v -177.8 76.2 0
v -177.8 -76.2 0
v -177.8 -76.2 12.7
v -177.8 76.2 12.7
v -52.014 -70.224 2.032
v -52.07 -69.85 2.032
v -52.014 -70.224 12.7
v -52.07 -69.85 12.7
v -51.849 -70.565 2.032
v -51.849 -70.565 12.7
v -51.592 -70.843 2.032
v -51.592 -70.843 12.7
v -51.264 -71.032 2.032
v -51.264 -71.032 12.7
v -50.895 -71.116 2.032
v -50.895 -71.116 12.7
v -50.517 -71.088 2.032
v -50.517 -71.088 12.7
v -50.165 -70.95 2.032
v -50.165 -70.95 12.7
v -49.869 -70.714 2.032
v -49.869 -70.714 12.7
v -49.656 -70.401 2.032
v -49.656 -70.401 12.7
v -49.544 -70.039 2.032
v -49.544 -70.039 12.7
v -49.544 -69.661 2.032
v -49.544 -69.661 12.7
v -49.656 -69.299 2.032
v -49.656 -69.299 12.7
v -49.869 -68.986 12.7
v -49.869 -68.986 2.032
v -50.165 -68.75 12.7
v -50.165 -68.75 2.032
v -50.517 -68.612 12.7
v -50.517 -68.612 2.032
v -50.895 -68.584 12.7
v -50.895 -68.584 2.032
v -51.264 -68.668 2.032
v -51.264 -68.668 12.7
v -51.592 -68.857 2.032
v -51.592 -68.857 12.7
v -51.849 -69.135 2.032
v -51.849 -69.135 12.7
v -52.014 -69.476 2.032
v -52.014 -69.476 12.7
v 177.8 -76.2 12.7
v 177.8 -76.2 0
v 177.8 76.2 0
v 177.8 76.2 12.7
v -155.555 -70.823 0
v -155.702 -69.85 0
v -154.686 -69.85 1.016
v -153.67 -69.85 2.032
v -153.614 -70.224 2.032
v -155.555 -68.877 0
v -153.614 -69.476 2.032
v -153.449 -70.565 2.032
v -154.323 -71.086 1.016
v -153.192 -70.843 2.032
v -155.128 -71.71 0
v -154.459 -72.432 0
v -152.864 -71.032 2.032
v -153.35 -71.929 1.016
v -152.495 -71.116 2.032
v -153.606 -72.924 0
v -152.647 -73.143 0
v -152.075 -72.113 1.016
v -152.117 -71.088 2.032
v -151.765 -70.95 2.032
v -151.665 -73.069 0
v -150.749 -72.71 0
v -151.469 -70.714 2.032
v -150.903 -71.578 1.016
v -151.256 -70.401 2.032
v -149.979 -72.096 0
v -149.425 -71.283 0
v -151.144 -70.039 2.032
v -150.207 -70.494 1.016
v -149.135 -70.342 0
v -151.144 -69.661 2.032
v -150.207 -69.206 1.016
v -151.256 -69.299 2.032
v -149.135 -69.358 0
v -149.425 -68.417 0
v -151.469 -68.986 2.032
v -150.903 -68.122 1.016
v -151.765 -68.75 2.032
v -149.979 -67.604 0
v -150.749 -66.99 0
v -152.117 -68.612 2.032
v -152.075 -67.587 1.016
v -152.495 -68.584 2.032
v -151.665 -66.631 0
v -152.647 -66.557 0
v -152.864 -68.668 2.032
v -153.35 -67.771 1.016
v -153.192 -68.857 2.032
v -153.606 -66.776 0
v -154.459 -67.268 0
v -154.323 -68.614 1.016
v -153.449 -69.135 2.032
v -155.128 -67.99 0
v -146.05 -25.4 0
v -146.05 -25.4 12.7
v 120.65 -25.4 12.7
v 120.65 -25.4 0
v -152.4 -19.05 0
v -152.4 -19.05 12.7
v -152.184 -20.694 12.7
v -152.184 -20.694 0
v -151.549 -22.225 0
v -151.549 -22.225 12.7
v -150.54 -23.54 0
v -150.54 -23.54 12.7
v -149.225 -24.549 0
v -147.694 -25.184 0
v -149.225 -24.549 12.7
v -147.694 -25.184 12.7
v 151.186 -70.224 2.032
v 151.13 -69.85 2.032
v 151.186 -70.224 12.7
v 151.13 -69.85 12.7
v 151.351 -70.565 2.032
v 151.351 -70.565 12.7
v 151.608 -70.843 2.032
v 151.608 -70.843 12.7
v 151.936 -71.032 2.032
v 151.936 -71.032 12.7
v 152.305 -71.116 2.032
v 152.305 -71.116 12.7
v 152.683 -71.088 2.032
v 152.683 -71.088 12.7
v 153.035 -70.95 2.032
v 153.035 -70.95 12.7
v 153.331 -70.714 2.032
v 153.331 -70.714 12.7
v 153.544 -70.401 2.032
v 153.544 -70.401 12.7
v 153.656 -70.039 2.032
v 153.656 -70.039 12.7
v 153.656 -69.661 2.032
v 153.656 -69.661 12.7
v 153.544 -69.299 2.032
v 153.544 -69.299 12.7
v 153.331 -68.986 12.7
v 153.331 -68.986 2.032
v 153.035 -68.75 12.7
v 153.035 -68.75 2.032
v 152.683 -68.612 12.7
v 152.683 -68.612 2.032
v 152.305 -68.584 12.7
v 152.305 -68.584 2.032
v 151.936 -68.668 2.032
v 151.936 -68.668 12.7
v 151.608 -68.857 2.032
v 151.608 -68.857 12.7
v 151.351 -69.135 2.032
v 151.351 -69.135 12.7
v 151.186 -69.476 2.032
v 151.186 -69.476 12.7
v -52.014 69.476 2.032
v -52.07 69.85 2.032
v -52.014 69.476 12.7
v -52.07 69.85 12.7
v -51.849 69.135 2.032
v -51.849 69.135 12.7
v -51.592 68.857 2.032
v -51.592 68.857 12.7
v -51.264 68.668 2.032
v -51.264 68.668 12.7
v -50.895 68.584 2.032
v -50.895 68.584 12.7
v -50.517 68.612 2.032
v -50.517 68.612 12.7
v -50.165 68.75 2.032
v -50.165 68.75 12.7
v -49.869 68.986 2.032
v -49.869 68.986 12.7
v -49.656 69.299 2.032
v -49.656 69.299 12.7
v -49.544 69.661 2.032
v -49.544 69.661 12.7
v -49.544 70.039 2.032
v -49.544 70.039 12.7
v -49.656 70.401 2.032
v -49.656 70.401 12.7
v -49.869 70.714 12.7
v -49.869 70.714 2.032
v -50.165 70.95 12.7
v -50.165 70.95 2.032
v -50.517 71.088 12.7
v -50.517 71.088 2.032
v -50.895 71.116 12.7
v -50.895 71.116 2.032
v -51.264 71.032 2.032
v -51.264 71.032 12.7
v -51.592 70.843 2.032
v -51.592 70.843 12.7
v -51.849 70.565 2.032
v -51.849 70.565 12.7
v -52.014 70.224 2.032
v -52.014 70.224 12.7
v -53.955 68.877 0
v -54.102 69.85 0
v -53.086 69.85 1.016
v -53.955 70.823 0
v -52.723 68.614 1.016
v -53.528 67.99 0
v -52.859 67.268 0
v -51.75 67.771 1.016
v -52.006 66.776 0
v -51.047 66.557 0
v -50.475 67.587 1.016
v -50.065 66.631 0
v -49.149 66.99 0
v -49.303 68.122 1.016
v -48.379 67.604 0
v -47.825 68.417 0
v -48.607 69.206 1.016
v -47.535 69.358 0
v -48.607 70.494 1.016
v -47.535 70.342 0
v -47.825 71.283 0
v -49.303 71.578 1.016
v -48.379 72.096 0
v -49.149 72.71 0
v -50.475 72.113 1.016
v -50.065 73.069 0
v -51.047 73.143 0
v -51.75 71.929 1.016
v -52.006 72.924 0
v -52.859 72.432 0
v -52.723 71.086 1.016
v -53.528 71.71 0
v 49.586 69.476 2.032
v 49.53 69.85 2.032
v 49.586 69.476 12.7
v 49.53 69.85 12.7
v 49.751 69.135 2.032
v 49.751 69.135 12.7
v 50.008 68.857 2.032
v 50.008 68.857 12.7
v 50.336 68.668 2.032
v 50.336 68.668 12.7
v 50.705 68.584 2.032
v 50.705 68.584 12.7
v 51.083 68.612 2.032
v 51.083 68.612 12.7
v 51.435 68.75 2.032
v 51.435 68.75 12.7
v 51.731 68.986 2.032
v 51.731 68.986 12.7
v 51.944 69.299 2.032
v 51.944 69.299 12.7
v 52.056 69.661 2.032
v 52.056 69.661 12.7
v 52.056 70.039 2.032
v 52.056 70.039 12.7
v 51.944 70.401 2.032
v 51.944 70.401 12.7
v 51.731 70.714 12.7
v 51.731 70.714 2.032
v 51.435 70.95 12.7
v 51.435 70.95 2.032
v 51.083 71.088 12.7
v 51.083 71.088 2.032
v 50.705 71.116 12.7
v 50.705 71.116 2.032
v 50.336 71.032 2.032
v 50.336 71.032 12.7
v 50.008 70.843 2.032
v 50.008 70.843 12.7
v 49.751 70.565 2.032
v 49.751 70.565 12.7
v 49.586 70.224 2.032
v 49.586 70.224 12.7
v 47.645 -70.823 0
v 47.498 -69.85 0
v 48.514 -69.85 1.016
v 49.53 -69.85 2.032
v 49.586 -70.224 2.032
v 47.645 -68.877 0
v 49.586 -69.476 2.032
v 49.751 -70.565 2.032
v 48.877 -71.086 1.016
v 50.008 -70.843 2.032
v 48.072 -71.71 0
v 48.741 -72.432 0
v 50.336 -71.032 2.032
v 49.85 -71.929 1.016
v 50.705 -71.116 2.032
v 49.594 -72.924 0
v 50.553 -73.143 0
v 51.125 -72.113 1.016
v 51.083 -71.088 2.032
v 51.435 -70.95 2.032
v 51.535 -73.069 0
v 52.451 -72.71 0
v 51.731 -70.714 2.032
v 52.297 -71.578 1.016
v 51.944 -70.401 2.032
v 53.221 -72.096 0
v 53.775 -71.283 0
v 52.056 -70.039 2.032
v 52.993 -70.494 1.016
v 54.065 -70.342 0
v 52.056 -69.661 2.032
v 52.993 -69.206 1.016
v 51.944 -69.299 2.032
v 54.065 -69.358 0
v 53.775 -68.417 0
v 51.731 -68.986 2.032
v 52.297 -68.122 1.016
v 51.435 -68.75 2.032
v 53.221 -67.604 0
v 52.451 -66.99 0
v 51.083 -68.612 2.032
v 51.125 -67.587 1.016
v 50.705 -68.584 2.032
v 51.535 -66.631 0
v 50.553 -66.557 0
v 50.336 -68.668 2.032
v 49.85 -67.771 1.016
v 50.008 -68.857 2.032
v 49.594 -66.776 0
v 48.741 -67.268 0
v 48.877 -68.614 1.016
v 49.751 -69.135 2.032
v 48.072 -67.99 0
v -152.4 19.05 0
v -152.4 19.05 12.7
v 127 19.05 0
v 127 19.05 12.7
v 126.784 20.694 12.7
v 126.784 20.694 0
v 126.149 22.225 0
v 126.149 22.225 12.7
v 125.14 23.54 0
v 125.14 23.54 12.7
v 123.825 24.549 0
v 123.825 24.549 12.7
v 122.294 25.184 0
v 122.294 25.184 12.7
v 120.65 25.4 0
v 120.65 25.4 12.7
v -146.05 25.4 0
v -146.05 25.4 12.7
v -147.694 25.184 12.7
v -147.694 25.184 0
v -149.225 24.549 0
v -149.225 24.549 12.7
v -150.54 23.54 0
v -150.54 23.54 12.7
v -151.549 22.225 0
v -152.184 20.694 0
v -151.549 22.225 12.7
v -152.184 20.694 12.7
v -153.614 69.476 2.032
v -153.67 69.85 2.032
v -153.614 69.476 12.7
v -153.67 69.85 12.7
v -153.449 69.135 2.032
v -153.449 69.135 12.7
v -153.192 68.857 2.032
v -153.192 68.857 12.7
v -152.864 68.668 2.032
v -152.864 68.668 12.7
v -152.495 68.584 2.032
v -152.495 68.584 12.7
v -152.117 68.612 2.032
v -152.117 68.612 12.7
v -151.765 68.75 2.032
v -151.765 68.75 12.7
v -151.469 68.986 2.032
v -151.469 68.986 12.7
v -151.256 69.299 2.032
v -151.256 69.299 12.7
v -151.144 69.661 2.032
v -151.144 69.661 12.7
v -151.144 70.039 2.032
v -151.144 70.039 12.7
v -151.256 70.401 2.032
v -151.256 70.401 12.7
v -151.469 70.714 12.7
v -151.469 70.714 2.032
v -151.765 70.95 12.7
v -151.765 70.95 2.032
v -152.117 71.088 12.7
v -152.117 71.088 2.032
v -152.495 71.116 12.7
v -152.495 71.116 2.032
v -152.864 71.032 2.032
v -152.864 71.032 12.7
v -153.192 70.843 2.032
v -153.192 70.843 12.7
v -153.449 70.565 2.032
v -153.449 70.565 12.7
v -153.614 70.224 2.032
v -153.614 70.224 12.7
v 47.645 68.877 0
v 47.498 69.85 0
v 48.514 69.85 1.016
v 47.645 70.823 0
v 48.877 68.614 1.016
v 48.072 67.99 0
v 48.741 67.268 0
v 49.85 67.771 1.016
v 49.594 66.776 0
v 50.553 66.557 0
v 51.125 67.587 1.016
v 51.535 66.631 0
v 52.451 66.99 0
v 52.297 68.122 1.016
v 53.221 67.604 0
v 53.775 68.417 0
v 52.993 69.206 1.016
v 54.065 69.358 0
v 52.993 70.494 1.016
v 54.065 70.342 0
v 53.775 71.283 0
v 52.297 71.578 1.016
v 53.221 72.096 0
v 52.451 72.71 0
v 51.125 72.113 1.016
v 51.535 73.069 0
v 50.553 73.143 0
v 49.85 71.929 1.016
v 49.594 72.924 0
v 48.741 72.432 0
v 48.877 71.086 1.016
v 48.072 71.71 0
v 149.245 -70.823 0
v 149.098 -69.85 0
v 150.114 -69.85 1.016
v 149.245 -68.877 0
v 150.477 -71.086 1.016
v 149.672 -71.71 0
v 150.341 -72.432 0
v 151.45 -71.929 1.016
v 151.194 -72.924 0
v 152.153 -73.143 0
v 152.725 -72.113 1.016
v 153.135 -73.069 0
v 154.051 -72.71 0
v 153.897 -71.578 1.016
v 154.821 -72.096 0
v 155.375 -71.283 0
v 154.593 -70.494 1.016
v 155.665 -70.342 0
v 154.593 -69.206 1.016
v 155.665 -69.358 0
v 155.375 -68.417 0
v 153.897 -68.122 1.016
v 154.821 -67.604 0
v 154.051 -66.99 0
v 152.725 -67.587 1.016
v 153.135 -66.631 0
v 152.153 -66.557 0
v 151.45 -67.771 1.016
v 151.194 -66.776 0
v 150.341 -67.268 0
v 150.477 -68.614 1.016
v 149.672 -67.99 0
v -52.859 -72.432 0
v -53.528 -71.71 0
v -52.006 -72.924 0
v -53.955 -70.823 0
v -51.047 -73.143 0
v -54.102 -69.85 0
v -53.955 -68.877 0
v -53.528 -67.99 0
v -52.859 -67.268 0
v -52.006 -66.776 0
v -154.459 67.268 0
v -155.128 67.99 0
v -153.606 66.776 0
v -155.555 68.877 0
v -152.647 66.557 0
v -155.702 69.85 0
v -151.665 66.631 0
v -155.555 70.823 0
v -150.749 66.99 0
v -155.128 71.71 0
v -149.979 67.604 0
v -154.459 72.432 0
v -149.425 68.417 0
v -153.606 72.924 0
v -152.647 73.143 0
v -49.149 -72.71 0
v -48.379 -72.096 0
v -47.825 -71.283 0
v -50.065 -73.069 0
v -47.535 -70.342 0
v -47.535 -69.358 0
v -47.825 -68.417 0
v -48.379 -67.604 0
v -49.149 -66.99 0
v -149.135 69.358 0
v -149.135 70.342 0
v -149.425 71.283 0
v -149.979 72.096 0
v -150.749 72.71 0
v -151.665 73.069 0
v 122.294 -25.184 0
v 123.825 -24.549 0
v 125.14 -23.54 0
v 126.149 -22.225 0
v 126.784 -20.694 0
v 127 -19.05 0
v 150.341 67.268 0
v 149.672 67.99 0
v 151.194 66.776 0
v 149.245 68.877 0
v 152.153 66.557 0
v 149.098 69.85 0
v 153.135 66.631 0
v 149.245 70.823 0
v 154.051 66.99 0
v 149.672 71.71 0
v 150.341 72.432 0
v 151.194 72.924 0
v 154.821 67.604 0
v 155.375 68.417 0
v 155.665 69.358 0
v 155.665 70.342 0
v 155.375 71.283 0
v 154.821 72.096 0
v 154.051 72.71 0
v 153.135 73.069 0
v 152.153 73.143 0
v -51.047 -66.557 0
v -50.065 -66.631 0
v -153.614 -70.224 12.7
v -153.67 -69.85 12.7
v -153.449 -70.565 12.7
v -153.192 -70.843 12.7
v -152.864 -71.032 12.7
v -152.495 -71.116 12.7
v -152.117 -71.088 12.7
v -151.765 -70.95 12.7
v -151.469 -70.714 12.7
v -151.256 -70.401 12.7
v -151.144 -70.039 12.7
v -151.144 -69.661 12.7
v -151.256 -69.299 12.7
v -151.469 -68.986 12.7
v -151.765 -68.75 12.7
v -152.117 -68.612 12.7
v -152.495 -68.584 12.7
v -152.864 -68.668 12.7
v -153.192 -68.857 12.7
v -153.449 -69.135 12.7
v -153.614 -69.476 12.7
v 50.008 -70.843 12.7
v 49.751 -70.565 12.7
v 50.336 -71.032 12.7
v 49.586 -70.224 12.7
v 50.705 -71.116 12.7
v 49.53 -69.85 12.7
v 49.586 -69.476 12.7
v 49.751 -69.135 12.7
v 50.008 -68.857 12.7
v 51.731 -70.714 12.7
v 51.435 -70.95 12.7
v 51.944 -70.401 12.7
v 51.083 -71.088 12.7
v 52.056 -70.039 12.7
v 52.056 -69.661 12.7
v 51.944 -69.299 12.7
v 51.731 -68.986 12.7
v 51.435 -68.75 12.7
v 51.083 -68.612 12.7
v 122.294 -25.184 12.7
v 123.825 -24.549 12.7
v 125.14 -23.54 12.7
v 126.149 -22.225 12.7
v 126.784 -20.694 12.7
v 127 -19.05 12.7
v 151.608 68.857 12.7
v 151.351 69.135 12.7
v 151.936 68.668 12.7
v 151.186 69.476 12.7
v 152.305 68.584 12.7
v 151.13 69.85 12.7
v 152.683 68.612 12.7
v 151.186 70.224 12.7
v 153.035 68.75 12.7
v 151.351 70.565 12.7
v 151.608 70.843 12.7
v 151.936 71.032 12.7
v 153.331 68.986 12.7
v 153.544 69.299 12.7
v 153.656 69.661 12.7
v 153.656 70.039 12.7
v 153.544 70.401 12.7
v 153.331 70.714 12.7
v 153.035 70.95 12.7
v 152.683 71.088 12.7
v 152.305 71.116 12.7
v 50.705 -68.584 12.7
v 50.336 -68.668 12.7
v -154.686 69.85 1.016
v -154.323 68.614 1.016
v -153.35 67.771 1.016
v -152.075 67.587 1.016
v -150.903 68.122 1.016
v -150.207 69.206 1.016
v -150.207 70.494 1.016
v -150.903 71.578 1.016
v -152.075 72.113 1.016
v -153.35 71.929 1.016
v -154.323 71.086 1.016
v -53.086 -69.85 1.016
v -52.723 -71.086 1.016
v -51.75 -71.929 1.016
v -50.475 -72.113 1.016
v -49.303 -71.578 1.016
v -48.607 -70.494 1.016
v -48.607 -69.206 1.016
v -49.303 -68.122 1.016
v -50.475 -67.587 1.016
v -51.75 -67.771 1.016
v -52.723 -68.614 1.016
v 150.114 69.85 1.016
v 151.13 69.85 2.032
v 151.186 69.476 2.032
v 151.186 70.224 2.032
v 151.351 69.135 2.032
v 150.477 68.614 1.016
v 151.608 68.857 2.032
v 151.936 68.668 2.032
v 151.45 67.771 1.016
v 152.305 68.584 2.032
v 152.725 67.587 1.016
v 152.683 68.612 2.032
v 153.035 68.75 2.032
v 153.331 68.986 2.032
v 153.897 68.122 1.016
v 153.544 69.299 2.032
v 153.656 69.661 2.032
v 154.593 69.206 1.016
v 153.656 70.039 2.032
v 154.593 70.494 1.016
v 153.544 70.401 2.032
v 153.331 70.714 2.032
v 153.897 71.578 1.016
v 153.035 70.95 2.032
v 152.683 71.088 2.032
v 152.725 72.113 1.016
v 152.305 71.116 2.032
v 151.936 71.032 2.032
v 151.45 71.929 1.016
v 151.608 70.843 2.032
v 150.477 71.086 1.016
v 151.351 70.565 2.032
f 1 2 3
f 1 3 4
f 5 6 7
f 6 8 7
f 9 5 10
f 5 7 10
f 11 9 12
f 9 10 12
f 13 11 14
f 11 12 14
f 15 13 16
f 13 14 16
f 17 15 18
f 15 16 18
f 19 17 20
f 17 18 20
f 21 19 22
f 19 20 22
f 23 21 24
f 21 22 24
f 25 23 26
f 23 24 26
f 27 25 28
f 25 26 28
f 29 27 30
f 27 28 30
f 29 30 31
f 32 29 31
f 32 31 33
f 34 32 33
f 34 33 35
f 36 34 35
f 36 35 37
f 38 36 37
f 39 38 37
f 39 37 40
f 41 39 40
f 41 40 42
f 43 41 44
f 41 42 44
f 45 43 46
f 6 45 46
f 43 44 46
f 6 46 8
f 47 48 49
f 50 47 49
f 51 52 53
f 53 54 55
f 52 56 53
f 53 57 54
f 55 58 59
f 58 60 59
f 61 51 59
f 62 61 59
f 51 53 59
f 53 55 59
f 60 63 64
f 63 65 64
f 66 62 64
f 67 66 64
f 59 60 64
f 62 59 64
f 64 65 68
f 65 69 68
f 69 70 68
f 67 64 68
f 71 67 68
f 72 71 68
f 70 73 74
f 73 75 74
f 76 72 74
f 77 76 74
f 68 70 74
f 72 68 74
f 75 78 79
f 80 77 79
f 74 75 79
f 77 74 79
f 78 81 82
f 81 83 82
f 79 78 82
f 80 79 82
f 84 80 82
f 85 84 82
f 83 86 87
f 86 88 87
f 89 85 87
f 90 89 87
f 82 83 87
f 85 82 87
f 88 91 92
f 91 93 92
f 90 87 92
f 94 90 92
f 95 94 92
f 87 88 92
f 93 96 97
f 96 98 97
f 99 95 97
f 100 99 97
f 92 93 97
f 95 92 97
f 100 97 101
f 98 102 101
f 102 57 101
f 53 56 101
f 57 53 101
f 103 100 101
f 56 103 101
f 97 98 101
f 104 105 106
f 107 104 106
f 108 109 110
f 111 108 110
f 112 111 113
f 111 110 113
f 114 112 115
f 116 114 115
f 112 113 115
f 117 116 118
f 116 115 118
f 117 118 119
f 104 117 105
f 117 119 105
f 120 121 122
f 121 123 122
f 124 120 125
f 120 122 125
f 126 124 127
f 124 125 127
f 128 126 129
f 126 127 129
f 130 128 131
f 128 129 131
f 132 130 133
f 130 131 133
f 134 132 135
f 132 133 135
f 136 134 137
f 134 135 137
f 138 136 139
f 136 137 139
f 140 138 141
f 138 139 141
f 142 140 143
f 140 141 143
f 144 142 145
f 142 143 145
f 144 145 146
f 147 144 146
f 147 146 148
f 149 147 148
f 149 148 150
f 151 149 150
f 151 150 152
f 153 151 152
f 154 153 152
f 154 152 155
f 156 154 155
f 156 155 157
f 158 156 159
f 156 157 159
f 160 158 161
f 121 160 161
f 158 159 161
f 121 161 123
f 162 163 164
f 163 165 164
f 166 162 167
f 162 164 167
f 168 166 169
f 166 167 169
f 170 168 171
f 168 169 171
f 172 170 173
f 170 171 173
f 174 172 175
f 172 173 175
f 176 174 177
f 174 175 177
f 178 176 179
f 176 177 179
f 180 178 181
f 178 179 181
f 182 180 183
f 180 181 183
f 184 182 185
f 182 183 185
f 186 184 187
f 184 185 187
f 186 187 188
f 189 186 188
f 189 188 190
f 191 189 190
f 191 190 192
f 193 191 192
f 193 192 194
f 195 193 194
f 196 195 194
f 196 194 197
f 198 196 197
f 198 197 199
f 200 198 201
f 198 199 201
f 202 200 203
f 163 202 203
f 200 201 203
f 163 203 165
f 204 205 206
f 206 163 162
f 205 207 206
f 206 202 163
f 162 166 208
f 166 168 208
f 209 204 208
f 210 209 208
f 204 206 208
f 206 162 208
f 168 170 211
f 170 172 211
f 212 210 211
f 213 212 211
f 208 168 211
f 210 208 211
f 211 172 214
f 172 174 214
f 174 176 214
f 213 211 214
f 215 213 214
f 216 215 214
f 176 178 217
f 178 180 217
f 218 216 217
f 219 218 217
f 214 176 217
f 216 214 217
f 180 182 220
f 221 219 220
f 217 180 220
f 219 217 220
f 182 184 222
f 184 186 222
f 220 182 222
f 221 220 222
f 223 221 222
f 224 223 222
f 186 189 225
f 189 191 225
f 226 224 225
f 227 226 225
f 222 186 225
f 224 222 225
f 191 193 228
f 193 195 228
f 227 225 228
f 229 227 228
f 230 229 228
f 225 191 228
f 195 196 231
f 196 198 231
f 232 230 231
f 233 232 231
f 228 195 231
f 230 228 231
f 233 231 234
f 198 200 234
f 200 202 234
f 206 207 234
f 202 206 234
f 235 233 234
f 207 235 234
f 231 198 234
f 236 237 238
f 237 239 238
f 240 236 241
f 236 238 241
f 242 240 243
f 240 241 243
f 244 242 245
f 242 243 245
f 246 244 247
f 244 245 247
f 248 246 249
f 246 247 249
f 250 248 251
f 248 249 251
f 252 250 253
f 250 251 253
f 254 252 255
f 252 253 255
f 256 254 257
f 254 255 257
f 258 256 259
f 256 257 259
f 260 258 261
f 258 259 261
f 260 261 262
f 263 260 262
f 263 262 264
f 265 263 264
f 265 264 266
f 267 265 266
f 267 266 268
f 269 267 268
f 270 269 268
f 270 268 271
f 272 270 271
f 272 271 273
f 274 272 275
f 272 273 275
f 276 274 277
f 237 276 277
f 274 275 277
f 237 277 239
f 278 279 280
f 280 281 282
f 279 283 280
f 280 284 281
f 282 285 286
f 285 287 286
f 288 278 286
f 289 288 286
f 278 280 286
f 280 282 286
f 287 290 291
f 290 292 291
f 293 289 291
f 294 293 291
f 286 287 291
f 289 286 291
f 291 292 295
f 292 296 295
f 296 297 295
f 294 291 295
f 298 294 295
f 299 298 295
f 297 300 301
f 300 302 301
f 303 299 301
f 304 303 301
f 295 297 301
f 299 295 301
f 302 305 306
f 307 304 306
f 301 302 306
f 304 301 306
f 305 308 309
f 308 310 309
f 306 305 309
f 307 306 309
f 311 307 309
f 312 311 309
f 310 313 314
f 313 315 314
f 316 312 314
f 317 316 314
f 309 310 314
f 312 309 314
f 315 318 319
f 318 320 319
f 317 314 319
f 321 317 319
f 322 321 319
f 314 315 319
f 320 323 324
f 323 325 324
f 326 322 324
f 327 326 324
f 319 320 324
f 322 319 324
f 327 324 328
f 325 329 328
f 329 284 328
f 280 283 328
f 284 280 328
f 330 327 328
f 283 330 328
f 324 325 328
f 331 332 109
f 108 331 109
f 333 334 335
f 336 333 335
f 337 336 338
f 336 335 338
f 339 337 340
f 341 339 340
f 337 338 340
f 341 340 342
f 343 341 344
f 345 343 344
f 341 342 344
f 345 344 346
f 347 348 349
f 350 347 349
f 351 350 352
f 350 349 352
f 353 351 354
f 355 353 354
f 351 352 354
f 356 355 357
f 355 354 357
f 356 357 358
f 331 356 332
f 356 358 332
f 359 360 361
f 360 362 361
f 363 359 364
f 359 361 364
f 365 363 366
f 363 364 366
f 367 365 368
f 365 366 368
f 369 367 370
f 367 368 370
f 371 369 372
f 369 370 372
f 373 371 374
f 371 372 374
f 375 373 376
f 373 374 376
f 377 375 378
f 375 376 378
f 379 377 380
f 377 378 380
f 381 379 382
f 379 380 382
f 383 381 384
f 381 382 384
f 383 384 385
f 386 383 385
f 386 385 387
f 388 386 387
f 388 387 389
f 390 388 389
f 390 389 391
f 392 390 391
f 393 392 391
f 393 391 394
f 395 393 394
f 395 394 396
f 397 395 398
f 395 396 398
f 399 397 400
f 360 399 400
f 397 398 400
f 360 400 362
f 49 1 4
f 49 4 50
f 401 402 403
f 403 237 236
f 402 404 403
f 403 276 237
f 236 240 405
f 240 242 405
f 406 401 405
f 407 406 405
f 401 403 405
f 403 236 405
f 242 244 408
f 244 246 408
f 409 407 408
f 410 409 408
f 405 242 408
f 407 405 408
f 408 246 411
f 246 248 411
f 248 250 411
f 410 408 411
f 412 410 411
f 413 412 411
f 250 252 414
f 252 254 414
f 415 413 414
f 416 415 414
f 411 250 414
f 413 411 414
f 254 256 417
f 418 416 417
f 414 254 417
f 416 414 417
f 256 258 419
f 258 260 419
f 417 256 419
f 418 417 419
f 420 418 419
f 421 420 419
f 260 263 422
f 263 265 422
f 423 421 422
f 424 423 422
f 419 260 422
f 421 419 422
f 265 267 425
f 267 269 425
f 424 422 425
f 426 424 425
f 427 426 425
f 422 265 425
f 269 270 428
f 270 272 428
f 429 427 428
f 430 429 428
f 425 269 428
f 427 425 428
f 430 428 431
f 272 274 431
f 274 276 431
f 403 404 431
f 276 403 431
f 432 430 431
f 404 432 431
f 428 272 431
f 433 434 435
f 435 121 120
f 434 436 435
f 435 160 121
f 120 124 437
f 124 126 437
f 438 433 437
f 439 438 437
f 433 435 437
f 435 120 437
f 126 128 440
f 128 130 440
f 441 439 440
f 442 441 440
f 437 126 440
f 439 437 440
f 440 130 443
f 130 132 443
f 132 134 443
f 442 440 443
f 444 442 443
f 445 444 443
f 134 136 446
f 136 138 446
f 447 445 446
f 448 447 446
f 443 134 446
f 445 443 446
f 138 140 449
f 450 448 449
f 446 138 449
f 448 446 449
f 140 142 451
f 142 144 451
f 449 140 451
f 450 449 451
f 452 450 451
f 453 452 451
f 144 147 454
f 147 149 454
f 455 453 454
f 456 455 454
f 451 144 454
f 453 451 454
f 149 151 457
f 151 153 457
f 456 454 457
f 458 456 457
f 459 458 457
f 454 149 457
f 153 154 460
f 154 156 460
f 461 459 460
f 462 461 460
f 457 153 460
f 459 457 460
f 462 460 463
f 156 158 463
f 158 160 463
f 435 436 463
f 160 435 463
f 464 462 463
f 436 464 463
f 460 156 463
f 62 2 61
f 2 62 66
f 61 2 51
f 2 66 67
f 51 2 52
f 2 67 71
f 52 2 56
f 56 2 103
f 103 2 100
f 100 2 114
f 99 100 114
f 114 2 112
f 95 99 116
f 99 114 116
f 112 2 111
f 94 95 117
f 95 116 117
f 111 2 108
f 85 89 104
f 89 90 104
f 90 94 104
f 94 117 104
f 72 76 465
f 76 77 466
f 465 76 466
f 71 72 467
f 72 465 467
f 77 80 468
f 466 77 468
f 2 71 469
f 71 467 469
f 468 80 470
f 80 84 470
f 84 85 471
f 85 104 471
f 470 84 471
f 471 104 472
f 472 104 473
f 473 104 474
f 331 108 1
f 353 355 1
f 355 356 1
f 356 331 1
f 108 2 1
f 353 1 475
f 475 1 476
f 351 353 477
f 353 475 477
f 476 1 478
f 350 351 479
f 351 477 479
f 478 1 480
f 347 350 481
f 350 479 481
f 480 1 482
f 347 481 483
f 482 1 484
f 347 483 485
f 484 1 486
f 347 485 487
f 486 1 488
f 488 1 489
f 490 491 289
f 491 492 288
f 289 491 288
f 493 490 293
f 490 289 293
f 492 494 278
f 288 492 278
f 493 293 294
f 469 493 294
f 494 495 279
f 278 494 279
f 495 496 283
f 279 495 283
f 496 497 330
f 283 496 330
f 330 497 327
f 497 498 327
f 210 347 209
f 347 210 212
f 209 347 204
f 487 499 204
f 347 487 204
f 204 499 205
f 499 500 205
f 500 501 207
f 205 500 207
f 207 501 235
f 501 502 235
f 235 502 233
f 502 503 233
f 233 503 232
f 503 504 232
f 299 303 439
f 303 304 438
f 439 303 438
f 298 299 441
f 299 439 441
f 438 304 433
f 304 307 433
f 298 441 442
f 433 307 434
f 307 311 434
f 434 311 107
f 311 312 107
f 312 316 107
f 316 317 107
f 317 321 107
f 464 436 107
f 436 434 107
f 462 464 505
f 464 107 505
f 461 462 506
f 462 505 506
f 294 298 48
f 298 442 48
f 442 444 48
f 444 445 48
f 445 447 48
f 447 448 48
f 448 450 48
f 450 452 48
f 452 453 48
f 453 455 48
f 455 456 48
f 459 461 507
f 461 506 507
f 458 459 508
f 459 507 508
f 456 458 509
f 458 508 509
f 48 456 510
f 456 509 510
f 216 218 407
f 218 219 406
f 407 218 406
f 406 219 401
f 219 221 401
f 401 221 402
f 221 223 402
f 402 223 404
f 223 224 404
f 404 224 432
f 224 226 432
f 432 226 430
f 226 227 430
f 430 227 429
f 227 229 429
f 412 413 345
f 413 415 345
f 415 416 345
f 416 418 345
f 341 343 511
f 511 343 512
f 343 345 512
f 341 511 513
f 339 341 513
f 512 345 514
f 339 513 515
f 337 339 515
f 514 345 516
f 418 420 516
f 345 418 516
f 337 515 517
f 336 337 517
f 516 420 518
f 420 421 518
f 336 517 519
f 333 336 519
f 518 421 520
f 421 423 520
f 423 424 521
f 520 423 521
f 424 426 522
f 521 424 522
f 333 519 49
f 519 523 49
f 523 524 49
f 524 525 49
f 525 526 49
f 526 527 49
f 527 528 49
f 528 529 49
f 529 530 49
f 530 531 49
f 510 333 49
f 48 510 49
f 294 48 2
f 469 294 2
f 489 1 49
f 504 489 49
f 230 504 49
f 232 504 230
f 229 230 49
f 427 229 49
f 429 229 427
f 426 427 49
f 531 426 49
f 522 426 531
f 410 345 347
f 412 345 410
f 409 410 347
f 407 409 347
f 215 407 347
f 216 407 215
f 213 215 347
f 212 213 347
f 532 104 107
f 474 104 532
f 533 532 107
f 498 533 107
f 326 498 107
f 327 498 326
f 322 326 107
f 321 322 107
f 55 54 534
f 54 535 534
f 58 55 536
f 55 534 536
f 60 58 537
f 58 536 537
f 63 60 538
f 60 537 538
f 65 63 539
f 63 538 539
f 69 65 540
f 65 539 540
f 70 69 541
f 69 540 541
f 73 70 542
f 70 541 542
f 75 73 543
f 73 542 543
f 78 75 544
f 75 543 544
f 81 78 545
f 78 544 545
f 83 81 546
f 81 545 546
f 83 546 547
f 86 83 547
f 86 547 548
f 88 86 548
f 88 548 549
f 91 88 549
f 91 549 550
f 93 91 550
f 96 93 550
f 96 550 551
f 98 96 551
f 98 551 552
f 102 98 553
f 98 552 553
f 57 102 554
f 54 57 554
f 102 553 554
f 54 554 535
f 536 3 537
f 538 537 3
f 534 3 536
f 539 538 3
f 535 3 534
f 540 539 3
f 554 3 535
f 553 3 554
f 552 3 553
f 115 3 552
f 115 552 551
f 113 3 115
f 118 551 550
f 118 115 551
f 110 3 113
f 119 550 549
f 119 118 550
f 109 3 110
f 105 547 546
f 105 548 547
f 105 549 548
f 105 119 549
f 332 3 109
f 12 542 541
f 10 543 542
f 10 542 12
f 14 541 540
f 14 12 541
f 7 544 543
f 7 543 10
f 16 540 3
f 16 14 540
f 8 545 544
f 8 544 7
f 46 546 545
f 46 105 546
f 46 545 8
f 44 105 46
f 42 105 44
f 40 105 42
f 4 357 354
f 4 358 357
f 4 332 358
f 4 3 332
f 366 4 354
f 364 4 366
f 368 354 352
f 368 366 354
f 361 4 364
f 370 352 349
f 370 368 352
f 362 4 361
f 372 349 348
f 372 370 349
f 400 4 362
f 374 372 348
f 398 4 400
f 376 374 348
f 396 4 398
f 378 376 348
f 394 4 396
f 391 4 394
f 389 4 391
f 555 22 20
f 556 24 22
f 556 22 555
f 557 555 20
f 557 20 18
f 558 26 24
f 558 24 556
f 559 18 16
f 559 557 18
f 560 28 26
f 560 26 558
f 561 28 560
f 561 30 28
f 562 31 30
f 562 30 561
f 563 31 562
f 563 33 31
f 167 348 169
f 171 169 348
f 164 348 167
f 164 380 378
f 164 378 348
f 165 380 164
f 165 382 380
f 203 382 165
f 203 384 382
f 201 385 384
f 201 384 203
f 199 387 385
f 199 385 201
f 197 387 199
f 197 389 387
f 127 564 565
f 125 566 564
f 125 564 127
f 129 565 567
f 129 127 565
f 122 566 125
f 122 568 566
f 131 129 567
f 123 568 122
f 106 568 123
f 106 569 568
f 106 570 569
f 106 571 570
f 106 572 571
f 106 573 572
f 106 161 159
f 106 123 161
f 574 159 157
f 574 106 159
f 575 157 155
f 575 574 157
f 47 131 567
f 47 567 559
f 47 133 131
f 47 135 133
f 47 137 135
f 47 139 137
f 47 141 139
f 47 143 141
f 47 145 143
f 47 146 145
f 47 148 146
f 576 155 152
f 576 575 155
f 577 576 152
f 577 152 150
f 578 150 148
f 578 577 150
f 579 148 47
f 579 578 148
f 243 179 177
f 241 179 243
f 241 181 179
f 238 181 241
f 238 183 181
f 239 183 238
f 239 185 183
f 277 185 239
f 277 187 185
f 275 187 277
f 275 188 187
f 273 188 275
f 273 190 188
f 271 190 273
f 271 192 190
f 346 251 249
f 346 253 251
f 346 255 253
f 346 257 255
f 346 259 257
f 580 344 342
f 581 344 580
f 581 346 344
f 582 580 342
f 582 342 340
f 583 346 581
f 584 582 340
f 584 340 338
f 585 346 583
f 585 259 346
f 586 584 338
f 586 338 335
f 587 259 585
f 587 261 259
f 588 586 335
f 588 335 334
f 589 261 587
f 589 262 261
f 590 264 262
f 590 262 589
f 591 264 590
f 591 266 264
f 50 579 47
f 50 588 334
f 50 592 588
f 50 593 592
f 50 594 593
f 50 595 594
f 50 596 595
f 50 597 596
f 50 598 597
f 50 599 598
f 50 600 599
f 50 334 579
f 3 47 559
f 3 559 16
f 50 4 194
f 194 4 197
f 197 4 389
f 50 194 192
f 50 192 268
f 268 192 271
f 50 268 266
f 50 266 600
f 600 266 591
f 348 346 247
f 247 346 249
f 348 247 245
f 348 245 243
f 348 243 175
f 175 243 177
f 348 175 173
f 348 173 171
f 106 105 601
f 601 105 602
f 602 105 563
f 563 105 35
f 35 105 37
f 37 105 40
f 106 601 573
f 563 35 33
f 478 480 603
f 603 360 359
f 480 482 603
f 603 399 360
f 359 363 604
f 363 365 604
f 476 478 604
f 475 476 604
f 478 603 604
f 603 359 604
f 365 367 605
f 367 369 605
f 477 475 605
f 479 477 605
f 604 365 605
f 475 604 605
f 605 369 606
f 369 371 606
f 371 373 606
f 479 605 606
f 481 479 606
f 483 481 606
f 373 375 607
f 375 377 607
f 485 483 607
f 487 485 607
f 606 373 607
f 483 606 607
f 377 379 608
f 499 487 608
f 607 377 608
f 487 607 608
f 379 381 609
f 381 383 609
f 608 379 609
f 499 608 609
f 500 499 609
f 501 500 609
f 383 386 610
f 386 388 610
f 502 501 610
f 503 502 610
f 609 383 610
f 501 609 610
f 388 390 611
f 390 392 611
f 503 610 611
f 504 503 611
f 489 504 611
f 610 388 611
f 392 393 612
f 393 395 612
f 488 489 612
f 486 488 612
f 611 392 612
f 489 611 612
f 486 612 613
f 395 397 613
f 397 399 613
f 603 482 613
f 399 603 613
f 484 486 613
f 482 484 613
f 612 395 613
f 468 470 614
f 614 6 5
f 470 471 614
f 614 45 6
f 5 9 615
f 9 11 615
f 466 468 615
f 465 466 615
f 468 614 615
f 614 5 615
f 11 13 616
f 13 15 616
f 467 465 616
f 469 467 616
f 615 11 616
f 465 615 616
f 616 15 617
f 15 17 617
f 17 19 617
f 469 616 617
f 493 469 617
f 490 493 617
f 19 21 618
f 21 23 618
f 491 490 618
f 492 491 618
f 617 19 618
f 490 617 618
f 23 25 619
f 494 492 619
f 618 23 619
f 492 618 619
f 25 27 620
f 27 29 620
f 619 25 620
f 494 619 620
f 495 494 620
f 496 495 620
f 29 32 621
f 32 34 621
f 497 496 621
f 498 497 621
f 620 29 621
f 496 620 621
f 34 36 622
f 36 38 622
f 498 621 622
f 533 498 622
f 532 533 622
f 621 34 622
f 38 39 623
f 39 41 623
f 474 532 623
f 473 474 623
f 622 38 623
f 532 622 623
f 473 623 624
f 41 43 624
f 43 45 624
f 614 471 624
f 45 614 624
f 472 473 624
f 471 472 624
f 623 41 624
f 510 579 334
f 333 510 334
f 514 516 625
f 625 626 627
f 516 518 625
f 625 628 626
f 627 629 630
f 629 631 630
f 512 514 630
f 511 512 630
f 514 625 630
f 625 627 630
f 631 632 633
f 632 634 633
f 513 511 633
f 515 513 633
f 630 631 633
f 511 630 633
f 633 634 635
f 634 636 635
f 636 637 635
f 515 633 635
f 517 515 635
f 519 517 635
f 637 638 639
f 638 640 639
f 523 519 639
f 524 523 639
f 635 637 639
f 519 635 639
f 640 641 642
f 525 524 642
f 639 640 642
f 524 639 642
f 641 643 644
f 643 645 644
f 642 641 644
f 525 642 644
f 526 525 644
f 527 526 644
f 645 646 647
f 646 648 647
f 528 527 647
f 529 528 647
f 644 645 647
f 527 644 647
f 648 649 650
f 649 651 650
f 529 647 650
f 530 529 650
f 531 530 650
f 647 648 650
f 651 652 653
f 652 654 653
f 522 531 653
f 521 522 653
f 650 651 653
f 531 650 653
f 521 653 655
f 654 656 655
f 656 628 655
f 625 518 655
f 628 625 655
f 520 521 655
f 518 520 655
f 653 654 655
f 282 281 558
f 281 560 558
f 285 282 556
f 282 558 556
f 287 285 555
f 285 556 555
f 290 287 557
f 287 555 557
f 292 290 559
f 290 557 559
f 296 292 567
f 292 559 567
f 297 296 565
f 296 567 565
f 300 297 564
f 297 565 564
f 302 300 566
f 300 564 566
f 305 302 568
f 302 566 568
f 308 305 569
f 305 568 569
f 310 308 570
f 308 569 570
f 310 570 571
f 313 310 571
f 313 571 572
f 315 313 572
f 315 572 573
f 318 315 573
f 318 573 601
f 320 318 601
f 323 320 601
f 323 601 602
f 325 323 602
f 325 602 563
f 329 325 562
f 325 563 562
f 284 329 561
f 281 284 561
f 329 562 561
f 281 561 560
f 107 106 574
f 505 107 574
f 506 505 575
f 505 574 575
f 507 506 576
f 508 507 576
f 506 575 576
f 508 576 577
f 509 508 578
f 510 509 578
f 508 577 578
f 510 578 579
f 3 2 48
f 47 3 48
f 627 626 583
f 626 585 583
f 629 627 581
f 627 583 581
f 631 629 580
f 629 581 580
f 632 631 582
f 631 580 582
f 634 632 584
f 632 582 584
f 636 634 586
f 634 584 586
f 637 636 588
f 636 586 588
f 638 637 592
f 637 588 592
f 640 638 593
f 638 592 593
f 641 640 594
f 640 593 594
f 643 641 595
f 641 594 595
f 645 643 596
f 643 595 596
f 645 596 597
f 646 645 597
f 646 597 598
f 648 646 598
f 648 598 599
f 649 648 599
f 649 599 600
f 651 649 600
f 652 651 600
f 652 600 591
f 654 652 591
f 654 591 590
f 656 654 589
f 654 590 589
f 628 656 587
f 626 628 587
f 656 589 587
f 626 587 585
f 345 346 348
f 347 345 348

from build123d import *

# Parameters (mm, degrees)
F0_W           = 355.6
F0_H           = 152.4
F1_DEPTH       = 12.7
F3_DEPTH       = 12.701
F5_D           = 2.54
F5_CSINK_D     = 6.604
F5_CSINK_ANGLE = 90


with BuildPart() as f1:
    # F0 (on Top) → F1 (new body)
    with BuildSketch(Plane.XY):
        Rectangle(F0_W, F0_H)
    extrude(amount=F1_DEPTH)

    # F2 (on face) → F3 (cut, through all)
    with BuildSketch(Plane.XY.offset(12.7)):
        with BuildLine():
            Line((120.65, 25.4), (-146.05, 25.4))
            ThreePointArc((-146.05, 25.4), (-150.540128, 23.540128), (-152.4, 19.05))
            Line((-152.4, 19.05), (-152.4, -19.05))
            ThreePointArc((-152.4, -19.05), (-150.540128, -23.540128), (-146.05, -25.4))
            Line((-146.05, -25.4), (120.65, -25.4))
            ThreePointArc((120.65, -25.4), (125.140128, -23.540128), (127, -19.05))
            Line((127, -19.05), (127, 19.05))
            ThreePointArc((127, 19.05), (125.140128, 23.540128), (120.65, 25.4))
        make_face()
    extrude(amount=-F3_DEPTH, mode=Mode.SUBTRACT)

    # F5 (through all)
    with Locations(Plane(origin=(0, 0, 0), x_dir=(1, 0, 0), z_dir=(0, 0, -1))):
        with Locations((-152.4, 69.85), (-50.8, 69.85), (50.8, 69.85), (152.4, 69.85), (152.4, -69.85), (50.8, -69.85), (-50.8, -69.85), (-152.4, -69.85)):
            CounterSinkHole(F5_D / 2, F5_CSINK_D / 2, counter_sink_angle=F5_CSINK_ANGLE)


solid = f1.part
